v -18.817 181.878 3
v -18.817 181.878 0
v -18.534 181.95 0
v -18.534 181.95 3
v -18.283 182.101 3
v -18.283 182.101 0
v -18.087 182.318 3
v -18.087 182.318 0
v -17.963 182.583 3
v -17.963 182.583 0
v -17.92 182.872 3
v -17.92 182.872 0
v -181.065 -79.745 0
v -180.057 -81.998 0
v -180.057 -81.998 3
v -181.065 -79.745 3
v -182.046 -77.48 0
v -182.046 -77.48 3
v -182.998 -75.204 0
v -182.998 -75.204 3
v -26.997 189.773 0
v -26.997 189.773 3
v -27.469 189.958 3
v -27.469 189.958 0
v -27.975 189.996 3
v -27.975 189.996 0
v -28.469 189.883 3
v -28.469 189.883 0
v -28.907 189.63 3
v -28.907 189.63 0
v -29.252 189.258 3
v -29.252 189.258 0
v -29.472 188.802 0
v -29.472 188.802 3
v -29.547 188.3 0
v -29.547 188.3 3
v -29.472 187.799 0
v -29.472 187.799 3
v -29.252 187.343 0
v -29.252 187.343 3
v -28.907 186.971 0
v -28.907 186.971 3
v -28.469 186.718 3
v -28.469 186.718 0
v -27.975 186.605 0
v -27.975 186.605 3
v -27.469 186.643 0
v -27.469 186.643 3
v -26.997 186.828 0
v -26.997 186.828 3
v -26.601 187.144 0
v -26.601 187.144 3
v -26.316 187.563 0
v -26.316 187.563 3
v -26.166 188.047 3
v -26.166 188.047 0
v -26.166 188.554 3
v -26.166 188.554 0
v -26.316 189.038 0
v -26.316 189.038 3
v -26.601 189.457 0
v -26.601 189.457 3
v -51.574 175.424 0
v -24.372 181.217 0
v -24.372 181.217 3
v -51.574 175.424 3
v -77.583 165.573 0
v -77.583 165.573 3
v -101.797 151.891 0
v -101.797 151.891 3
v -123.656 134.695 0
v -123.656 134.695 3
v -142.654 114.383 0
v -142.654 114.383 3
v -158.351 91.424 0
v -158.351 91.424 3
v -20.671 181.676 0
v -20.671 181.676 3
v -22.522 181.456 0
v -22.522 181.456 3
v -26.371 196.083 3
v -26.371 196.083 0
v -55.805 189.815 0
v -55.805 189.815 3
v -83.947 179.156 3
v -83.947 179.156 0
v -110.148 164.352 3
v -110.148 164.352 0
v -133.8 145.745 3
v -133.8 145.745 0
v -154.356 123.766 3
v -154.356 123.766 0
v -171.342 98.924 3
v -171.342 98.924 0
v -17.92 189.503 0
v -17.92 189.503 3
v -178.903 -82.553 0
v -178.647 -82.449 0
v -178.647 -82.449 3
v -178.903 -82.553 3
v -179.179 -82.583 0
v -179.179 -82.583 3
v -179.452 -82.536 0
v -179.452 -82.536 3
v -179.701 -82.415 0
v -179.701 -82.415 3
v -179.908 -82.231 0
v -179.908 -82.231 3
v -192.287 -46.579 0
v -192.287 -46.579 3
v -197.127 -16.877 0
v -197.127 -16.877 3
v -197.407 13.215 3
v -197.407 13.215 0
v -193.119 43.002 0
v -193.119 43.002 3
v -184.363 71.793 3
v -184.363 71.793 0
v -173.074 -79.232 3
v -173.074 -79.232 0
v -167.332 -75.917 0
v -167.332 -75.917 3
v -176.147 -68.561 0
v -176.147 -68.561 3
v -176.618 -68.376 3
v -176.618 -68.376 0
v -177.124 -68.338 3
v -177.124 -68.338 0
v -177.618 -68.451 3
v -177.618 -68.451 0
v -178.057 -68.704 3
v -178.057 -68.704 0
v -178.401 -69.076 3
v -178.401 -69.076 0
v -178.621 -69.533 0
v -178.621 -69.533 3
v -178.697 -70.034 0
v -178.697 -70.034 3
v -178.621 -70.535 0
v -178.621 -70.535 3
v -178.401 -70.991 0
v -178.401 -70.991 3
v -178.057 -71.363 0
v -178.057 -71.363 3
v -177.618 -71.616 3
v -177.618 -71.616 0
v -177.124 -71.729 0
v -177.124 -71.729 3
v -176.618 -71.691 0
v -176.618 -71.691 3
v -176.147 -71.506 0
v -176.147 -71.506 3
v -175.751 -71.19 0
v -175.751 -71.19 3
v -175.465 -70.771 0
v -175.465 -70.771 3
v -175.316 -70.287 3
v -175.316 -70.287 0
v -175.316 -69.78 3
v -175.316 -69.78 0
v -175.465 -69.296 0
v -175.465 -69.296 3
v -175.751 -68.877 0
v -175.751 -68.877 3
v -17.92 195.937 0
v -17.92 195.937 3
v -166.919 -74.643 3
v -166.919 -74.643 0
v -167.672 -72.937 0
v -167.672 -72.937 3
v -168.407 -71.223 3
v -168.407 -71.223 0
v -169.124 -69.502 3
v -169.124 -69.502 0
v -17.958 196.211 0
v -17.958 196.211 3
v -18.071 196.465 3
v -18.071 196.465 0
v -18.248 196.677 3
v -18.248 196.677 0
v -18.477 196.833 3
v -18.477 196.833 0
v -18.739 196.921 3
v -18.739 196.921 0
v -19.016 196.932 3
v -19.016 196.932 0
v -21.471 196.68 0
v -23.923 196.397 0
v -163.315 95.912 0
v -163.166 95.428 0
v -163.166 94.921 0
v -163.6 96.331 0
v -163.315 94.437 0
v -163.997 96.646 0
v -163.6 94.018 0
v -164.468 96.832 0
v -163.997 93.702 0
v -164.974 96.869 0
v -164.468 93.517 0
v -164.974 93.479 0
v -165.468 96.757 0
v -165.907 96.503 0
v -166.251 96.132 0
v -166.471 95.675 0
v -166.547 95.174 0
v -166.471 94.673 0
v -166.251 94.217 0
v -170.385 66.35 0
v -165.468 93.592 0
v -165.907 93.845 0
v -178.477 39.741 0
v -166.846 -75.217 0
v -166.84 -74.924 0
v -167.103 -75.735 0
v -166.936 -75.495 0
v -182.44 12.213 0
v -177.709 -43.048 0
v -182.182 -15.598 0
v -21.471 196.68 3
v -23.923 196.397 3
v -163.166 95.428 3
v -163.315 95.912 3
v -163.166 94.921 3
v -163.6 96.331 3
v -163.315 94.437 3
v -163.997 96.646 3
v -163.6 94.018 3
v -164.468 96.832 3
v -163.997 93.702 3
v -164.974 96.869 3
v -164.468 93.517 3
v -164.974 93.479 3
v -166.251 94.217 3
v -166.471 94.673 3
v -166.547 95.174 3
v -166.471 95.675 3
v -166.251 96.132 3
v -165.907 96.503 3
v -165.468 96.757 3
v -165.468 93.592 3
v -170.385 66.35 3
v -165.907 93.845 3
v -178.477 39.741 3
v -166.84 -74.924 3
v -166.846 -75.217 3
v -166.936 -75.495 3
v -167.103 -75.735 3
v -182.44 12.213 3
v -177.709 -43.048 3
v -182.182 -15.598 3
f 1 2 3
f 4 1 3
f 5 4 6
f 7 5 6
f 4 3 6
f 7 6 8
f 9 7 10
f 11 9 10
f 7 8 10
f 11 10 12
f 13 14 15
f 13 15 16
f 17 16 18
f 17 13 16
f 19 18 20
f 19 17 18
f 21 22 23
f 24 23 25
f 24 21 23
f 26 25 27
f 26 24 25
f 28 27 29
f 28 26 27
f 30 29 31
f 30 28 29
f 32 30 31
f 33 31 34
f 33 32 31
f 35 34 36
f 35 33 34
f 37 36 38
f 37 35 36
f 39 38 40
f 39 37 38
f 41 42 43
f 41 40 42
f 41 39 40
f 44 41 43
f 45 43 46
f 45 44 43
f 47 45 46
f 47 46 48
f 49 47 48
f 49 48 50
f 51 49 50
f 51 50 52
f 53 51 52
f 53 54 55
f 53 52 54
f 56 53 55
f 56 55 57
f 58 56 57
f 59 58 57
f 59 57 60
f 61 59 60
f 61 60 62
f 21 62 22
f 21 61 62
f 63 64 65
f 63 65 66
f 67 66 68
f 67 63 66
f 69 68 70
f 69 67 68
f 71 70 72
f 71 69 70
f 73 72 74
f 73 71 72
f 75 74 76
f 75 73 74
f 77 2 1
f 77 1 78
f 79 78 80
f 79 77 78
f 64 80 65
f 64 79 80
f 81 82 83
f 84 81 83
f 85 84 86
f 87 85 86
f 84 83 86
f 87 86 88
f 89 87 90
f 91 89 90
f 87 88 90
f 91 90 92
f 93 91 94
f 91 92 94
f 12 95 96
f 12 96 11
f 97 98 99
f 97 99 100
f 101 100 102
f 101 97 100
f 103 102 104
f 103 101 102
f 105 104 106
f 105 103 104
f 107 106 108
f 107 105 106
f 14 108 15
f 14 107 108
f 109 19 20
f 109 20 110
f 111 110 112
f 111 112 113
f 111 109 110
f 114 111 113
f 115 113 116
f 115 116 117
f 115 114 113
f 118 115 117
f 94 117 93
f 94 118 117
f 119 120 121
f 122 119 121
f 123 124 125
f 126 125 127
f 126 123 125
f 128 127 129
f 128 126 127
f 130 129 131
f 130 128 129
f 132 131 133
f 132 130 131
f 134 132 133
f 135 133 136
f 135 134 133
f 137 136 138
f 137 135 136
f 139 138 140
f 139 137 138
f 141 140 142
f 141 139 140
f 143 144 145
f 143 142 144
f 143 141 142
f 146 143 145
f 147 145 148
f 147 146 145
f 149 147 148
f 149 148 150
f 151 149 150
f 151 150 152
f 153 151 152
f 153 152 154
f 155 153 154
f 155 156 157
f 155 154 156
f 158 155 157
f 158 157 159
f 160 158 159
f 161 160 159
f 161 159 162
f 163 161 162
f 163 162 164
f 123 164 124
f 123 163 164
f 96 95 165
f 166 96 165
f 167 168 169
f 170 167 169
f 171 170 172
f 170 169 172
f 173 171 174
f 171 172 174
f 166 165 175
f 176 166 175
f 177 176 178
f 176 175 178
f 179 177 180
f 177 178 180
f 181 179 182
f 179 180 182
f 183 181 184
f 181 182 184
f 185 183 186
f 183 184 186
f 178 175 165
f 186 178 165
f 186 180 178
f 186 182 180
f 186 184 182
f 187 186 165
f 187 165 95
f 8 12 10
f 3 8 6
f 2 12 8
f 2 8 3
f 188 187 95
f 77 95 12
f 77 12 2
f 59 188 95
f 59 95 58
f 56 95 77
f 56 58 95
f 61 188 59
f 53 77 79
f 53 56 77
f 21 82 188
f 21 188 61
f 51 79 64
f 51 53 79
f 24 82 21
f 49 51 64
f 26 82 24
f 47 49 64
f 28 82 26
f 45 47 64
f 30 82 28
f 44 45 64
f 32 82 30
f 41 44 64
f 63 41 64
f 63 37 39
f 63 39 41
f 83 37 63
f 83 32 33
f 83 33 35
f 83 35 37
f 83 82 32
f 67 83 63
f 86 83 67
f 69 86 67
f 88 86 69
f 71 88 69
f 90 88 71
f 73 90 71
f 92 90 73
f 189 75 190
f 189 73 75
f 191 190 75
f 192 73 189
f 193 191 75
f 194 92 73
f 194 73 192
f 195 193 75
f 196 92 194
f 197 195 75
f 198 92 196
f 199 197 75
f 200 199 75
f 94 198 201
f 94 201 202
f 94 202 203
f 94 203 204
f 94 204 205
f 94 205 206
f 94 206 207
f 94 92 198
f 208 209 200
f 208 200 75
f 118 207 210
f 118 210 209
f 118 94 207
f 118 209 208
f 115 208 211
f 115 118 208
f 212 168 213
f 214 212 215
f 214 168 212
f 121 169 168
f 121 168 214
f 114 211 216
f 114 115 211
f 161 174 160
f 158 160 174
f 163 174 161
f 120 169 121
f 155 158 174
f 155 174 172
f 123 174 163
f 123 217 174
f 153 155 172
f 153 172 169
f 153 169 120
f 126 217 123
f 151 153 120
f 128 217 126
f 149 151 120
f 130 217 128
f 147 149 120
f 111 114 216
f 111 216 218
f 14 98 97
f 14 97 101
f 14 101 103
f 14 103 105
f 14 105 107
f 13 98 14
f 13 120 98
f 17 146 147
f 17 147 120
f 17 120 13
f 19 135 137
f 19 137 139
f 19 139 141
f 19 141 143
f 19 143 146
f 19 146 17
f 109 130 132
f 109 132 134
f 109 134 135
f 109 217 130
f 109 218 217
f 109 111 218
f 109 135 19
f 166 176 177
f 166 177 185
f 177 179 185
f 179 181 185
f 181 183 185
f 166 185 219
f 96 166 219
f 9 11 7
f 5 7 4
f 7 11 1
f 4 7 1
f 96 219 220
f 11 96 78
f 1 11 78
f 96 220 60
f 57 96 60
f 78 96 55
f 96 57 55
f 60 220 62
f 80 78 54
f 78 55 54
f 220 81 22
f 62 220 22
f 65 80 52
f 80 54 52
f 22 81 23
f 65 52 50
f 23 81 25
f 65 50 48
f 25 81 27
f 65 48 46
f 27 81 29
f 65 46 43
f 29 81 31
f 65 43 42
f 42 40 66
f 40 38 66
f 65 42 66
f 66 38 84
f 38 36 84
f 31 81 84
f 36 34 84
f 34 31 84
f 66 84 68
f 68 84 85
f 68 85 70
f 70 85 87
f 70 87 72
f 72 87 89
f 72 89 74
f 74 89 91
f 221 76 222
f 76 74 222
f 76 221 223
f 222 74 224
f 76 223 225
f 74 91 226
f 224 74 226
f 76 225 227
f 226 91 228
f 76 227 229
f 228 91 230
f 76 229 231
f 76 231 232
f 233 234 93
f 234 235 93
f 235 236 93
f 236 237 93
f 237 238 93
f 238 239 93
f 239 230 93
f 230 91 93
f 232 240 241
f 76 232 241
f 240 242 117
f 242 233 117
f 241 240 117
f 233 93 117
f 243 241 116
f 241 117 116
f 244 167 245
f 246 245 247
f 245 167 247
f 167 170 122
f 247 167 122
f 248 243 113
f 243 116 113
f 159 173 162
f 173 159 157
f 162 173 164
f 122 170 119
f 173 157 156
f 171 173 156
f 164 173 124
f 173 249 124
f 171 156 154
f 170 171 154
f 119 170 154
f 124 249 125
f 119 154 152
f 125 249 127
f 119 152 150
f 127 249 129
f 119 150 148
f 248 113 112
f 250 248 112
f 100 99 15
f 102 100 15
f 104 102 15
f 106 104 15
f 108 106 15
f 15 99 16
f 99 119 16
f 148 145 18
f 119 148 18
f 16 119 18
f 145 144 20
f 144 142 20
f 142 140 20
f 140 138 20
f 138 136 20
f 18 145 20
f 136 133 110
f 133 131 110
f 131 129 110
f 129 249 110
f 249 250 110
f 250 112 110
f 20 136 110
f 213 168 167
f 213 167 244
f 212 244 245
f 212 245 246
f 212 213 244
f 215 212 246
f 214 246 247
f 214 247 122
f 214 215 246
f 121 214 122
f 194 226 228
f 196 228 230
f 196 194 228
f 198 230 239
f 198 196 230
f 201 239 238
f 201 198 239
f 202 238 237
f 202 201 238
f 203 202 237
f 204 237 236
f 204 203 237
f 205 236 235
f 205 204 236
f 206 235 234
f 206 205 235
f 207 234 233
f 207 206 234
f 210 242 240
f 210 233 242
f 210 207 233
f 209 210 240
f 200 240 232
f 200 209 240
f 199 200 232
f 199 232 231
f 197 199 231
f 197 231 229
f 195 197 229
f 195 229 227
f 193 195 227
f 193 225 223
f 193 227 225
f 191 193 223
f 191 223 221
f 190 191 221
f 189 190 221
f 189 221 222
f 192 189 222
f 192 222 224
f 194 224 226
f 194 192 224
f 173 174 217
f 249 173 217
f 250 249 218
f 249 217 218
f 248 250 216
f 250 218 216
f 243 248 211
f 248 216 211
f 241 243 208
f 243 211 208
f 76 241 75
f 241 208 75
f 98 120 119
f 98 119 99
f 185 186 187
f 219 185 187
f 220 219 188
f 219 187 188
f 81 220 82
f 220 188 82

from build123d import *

# Parameters (mm, degrees)
PAD021_DEPTH                        = 3
SKETCH083_R                         = 1.7
POCKET041_DEPTH                     = 0.001
POCKET041_DEPTH_BACK                = 3.001
SKETCH084_R                         = 1.7
POCKET042_DEPTH                     = 0.001
POCKET042_DEPTH_BACK                = 3.001
BODY001003005003013_PLACEMENT_ANGLE = 60


with BuildPart() as part:
    # Sketch082 → Pad021 (new body)
    with BuildSketch(Plane.XY):
        with BuildLine():
            ThreePointArc((156.627412, 120.879551), (87.258751, 177.56667), (0, 197.848457))
            Line((0, 197.848457), (0, 182.848457))
            ThreePointArc((144.752611, 111.714995), (80.643177, 164.104346), (0, 182.848457))
            ThreePointArc((148.102078, 107.234942), (146.444477, 109.487778), (144.752611, 111.714995))
            ThreePointArc((148.102078, 107.234942), (148.703343, 106.843433), (149.41205, 106.955386))
            Line((155.154429, 110.27075), (149.41205, 106.955386))
            Line((155.154429, 110.27075), (160.726477, 113.487773))
            ThreePointArc((160.726477, 113.487773), (161.203737, 114.141753), (161.040435, 114.934722))
            ThreePointArc((161.040435, 114.934722), (158.861734, 117.927781), (156.627412, 120.879551))
        make_face()
    pad021 = extrude(amount=PAD021_DEPTH)

    # Mirrored029: Pad021 across Sketch082 V_Axis
    add(pad021.mirror(Plane(origin=(0, 0, 0), x_dir=(0, 0, 1), z_dir=(1, 0, 0))))

    # Sketch083 → Pocket041 (cut, two sides)
    with BuildSketch(Plane.XY) as pocket041_sk:
        with Locations((149.149219, 118.266841)):
            Circle(SKETCH083_R)
        with Locations((-149.149219, 118.266841)):
            Circle(SKETCH083_R)
    extrude(amount=-POCKET041_DEPTH, mode=Mode.SUBTRACT)
    extrude(pocket041_sk.sketch, amount=POCKET041_DEPTH_BACK, mode=Mode.SUBTRACT)

    # Sketch084 → Pocket042 (cut, two sides)
    with BuildSketch(Plane.XY) as pocket042_sk:
        with Locations((0, 190.348457)):
            Circle(SKETCH084_R)
    extrude(amount=-POCKET042_DEPTH, mode=Mode.SUBTRACT)
    extrude(pocket042_sk.sketch, amount=POCKET042_DEPTH_BACK, mode=Mode.SUBTRACT)


with BuildPart() as part_1:
    # Body001003005003013 placement: moved
    add(part.part.rotate(Axis((0, 0, 0), (0, 0, 1)), BODY001003005003013_PLACEMENT_ANGLE))


solid = part_1.part
